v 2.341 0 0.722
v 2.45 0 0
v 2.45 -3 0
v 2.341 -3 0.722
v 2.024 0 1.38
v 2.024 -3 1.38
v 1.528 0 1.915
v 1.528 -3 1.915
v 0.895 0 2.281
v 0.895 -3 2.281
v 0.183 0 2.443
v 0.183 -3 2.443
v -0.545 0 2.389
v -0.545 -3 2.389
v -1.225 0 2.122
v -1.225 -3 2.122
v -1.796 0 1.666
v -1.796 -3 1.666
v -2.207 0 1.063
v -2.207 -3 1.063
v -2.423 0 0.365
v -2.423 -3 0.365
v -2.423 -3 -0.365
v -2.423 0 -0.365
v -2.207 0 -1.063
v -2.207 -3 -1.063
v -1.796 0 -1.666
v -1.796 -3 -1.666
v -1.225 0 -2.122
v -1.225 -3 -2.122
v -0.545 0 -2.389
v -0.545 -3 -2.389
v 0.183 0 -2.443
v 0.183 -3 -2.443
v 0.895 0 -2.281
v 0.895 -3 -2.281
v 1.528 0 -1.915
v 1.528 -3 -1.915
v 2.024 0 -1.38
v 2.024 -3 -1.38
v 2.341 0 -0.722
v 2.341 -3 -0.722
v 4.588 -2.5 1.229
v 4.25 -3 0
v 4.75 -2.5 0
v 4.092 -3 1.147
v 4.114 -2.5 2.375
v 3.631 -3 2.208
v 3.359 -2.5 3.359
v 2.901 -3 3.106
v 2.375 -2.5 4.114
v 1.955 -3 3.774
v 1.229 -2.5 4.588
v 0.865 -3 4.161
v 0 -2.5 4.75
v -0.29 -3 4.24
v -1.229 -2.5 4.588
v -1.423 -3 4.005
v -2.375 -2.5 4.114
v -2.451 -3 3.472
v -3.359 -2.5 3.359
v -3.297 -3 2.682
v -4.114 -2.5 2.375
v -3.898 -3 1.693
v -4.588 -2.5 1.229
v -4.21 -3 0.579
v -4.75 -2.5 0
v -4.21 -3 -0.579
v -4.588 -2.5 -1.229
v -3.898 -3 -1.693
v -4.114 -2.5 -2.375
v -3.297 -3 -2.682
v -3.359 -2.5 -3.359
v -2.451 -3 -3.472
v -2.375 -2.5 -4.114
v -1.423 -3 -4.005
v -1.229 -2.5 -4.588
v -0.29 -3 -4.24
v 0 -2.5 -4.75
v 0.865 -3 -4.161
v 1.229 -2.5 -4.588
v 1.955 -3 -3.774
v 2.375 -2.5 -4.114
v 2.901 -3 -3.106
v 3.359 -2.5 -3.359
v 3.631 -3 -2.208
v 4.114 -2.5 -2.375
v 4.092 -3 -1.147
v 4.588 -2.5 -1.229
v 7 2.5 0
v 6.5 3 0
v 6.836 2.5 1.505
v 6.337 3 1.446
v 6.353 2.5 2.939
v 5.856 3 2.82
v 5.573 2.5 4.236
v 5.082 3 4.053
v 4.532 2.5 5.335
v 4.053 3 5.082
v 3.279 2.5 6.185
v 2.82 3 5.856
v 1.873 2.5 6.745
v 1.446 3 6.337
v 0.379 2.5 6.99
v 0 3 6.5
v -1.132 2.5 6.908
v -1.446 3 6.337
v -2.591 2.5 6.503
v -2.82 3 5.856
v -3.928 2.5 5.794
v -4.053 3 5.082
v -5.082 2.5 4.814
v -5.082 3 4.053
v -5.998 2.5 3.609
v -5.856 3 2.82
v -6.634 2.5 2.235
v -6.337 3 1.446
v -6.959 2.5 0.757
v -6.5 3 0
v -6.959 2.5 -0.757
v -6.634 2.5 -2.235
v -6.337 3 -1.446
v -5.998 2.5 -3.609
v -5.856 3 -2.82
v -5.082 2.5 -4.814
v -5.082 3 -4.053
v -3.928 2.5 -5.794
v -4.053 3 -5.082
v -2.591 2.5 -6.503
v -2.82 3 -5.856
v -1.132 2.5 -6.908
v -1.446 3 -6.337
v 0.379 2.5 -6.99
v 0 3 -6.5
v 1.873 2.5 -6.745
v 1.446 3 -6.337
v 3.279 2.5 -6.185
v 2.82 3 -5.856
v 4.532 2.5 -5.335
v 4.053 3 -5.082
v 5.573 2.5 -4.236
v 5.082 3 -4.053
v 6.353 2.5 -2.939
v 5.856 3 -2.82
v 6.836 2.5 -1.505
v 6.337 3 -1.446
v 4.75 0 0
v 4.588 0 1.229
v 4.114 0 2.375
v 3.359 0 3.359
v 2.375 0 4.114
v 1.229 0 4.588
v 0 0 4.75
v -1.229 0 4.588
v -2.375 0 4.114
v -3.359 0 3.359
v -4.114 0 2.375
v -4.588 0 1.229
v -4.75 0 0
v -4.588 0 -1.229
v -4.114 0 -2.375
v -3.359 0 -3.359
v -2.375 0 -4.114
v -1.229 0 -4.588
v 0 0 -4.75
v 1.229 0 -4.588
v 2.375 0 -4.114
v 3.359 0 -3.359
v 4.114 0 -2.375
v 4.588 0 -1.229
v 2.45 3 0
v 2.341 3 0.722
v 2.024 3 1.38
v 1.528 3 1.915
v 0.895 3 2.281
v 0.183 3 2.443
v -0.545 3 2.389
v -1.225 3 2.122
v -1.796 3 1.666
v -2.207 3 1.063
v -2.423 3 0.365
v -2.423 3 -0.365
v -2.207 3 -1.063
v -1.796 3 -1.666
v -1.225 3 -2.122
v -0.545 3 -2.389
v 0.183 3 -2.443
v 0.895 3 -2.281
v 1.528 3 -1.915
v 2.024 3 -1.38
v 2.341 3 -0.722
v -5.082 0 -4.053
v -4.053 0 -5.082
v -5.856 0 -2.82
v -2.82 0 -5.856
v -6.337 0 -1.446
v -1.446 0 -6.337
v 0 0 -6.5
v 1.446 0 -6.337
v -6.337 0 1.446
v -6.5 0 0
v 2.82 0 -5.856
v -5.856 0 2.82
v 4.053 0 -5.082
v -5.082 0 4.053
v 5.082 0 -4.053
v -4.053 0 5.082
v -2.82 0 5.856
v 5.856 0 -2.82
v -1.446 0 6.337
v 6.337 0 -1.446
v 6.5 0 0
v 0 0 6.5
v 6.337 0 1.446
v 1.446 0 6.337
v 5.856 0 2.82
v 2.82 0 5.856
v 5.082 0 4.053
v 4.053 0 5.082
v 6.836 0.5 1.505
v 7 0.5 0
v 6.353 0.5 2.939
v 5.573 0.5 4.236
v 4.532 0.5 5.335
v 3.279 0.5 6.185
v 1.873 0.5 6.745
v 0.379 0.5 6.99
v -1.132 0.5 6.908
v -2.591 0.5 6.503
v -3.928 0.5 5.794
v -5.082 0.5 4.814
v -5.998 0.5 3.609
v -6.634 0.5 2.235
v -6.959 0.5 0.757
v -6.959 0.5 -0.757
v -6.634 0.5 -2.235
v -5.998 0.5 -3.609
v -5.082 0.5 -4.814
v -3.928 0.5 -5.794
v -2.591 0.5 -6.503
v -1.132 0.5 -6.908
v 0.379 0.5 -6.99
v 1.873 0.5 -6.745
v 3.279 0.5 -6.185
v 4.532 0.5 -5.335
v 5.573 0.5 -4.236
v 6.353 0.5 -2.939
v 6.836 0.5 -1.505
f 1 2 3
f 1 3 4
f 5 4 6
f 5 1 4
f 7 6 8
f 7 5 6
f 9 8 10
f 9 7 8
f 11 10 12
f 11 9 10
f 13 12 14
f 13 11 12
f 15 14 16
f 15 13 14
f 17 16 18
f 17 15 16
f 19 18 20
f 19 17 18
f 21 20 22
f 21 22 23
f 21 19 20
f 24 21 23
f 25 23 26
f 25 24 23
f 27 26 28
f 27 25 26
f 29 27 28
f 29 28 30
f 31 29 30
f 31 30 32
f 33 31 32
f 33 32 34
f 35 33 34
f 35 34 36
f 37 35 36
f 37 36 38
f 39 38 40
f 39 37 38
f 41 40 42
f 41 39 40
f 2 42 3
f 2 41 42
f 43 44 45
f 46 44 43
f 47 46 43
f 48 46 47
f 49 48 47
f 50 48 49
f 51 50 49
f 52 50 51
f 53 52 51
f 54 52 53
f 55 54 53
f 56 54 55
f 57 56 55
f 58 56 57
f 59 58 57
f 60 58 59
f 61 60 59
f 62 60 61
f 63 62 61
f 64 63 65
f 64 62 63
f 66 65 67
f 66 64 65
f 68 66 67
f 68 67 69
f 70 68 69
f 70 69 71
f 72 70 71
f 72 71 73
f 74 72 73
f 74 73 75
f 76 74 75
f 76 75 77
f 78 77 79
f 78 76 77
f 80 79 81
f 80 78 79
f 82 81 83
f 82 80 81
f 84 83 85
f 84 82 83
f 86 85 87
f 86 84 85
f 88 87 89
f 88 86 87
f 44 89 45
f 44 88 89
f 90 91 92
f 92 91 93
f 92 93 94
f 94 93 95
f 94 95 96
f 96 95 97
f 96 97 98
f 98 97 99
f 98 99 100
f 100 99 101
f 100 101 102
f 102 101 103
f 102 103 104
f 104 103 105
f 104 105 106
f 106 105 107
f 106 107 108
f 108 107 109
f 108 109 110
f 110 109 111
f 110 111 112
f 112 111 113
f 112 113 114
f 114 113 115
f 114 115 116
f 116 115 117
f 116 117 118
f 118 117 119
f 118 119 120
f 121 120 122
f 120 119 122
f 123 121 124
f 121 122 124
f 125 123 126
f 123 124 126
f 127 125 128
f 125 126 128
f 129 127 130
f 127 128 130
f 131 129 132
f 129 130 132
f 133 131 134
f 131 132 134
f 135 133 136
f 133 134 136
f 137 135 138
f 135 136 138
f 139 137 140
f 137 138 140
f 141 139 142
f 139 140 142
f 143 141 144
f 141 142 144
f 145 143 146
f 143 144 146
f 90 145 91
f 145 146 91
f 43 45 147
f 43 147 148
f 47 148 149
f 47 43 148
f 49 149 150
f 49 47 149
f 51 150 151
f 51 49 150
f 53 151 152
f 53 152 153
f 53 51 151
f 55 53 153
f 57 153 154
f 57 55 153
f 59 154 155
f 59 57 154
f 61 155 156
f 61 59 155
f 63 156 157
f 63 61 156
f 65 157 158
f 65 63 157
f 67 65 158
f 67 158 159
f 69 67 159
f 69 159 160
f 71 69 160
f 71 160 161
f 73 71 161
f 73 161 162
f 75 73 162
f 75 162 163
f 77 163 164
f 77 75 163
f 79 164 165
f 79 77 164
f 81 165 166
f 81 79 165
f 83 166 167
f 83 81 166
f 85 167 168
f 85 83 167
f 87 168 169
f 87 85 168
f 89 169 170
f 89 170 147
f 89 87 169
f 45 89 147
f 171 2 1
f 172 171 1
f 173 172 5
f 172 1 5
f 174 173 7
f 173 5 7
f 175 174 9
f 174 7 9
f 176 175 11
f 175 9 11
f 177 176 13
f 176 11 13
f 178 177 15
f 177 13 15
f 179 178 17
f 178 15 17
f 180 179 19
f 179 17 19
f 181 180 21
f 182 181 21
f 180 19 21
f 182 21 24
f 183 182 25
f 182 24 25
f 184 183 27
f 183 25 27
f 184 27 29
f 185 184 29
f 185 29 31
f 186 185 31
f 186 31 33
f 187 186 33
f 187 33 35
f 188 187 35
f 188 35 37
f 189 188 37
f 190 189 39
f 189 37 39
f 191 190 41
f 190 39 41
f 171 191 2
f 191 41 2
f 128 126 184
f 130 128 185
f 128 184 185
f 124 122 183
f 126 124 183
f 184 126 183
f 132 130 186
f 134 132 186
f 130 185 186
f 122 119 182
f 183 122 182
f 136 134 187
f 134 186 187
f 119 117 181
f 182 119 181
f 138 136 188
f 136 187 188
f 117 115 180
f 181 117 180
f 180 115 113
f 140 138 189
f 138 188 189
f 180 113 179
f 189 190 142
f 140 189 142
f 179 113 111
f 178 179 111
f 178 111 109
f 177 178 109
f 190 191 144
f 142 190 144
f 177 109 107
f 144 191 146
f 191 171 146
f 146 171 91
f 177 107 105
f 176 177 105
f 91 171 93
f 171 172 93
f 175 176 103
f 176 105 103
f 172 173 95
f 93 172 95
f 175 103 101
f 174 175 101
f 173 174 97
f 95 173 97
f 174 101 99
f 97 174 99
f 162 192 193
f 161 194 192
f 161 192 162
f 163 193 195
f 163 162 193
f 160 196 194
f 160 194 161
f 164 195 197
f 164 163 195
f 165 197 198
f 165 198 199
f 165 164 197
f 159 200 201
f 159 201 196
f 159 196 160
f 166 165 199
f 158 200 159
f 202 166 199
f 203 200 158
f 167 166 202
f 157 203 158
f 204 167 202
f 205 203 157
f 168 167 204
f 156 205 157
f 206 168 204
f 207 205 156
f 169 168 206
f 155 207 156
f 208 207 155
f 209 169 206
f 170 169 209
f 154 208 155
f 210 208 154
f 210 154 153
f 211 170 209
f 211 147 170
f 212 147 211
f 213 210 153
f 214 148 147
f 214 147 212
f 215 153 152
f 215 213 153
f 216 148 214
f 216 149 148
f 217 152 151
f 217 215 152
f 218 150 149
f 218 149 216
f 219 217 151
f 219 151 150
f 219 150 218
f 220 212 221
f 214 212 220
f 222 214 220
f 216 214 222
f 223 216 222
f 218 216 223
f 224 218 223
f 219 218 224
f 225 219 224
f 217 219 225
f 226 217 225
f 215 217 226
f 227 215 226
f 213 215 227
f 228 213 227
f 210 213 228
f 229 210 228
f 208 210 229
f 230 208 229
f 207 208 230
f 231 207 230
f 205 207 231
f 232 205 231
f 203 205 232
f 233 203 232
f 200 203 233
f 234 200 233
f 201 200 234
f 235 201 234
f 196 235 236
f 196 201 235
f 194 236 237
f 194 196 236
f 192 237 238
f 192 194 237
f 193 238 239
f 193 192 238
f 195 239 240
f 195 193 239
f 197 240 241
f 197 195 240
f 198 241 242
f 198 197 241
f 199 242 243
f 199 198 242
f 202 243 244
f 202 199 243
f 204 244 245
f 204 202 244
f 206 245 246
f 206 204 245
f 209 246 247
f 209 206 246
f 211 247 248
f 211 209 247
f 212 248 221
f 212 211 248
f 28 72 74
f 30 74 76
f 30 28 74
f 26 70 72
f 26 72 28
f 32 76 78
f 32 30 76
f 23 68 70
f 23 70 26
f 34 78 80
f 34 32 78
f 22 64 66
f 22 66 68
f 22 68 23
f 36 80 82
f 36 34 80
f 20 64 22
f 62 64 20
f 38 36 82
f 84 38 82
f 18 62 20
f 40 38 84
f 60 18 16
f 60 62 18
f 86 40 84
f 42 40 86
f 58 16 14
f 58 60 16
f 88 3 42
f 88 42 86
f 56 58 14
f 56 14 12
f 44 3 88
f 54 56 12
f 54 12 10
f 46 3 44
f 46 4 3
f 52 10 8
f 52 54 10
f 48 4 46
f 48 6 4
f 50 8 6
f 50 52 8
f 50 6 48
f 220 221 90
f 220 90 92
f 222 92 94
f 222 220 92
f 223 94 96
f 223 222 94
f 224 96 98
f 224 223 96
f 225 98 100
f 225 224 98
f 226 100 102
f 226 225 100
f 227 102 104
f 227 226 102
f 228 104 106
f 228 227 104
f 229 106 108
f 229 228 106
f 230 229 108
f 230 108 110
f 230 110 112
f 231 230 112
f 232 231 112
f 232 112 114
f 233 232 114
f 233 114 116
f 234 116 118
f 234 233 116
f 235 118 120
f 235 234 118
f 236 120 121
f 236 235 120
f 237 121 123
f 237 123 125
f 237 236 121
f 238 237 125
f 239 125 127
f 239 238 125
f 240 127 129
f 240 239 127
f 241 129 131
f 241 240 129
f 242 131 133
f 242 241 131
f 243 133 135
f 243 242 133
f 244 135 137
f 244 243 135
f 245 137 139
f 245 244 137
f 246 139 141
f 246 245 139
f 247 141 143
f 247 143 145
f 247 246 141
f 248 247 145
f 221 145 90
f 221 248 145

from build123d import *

# Parameters (mm, degrees)
F0_R          = 4.75
F0_R_2        = 2.45
F1_DEPTH      = 3
F1_DEPTH_BACK = 3
F0_R_3        = 7
F2_DEPTH      = 3
F3_SIZE       = 0.5


with BuildPart() as f1:
    # F0 (on Front) → F1 (new body, two sides)
    with BuildSketch(Plane.XZ) as f1_sk:
        Circle(F0_R)
        Circle(F0_R_2, mode=Mode.SUBTRACT)
    extrude(amount=F1_DEPTH)
    extrude(f1_sk.sketch, amount=-F1_DEPTH_BACK)

    # F0 (on Front) → F2 (join)
    with BuildSketch(Plane.XZ):
        Circle(F0_R_3)
        Circle(F0_R, mode=Mode.SUBTRACT)
    extrude(amount=-F2_DEPTH)

    # F3
    f3_edges = [f1.edges().sort_by_distance(p)[0] for p in [
        (-4.75, -3, 0),
        (-7, 0, 0),
        (-7, 3, 0),
    ]]
    chamfer(f3_edges, length=F3_SIZE)


solid = f1.part
